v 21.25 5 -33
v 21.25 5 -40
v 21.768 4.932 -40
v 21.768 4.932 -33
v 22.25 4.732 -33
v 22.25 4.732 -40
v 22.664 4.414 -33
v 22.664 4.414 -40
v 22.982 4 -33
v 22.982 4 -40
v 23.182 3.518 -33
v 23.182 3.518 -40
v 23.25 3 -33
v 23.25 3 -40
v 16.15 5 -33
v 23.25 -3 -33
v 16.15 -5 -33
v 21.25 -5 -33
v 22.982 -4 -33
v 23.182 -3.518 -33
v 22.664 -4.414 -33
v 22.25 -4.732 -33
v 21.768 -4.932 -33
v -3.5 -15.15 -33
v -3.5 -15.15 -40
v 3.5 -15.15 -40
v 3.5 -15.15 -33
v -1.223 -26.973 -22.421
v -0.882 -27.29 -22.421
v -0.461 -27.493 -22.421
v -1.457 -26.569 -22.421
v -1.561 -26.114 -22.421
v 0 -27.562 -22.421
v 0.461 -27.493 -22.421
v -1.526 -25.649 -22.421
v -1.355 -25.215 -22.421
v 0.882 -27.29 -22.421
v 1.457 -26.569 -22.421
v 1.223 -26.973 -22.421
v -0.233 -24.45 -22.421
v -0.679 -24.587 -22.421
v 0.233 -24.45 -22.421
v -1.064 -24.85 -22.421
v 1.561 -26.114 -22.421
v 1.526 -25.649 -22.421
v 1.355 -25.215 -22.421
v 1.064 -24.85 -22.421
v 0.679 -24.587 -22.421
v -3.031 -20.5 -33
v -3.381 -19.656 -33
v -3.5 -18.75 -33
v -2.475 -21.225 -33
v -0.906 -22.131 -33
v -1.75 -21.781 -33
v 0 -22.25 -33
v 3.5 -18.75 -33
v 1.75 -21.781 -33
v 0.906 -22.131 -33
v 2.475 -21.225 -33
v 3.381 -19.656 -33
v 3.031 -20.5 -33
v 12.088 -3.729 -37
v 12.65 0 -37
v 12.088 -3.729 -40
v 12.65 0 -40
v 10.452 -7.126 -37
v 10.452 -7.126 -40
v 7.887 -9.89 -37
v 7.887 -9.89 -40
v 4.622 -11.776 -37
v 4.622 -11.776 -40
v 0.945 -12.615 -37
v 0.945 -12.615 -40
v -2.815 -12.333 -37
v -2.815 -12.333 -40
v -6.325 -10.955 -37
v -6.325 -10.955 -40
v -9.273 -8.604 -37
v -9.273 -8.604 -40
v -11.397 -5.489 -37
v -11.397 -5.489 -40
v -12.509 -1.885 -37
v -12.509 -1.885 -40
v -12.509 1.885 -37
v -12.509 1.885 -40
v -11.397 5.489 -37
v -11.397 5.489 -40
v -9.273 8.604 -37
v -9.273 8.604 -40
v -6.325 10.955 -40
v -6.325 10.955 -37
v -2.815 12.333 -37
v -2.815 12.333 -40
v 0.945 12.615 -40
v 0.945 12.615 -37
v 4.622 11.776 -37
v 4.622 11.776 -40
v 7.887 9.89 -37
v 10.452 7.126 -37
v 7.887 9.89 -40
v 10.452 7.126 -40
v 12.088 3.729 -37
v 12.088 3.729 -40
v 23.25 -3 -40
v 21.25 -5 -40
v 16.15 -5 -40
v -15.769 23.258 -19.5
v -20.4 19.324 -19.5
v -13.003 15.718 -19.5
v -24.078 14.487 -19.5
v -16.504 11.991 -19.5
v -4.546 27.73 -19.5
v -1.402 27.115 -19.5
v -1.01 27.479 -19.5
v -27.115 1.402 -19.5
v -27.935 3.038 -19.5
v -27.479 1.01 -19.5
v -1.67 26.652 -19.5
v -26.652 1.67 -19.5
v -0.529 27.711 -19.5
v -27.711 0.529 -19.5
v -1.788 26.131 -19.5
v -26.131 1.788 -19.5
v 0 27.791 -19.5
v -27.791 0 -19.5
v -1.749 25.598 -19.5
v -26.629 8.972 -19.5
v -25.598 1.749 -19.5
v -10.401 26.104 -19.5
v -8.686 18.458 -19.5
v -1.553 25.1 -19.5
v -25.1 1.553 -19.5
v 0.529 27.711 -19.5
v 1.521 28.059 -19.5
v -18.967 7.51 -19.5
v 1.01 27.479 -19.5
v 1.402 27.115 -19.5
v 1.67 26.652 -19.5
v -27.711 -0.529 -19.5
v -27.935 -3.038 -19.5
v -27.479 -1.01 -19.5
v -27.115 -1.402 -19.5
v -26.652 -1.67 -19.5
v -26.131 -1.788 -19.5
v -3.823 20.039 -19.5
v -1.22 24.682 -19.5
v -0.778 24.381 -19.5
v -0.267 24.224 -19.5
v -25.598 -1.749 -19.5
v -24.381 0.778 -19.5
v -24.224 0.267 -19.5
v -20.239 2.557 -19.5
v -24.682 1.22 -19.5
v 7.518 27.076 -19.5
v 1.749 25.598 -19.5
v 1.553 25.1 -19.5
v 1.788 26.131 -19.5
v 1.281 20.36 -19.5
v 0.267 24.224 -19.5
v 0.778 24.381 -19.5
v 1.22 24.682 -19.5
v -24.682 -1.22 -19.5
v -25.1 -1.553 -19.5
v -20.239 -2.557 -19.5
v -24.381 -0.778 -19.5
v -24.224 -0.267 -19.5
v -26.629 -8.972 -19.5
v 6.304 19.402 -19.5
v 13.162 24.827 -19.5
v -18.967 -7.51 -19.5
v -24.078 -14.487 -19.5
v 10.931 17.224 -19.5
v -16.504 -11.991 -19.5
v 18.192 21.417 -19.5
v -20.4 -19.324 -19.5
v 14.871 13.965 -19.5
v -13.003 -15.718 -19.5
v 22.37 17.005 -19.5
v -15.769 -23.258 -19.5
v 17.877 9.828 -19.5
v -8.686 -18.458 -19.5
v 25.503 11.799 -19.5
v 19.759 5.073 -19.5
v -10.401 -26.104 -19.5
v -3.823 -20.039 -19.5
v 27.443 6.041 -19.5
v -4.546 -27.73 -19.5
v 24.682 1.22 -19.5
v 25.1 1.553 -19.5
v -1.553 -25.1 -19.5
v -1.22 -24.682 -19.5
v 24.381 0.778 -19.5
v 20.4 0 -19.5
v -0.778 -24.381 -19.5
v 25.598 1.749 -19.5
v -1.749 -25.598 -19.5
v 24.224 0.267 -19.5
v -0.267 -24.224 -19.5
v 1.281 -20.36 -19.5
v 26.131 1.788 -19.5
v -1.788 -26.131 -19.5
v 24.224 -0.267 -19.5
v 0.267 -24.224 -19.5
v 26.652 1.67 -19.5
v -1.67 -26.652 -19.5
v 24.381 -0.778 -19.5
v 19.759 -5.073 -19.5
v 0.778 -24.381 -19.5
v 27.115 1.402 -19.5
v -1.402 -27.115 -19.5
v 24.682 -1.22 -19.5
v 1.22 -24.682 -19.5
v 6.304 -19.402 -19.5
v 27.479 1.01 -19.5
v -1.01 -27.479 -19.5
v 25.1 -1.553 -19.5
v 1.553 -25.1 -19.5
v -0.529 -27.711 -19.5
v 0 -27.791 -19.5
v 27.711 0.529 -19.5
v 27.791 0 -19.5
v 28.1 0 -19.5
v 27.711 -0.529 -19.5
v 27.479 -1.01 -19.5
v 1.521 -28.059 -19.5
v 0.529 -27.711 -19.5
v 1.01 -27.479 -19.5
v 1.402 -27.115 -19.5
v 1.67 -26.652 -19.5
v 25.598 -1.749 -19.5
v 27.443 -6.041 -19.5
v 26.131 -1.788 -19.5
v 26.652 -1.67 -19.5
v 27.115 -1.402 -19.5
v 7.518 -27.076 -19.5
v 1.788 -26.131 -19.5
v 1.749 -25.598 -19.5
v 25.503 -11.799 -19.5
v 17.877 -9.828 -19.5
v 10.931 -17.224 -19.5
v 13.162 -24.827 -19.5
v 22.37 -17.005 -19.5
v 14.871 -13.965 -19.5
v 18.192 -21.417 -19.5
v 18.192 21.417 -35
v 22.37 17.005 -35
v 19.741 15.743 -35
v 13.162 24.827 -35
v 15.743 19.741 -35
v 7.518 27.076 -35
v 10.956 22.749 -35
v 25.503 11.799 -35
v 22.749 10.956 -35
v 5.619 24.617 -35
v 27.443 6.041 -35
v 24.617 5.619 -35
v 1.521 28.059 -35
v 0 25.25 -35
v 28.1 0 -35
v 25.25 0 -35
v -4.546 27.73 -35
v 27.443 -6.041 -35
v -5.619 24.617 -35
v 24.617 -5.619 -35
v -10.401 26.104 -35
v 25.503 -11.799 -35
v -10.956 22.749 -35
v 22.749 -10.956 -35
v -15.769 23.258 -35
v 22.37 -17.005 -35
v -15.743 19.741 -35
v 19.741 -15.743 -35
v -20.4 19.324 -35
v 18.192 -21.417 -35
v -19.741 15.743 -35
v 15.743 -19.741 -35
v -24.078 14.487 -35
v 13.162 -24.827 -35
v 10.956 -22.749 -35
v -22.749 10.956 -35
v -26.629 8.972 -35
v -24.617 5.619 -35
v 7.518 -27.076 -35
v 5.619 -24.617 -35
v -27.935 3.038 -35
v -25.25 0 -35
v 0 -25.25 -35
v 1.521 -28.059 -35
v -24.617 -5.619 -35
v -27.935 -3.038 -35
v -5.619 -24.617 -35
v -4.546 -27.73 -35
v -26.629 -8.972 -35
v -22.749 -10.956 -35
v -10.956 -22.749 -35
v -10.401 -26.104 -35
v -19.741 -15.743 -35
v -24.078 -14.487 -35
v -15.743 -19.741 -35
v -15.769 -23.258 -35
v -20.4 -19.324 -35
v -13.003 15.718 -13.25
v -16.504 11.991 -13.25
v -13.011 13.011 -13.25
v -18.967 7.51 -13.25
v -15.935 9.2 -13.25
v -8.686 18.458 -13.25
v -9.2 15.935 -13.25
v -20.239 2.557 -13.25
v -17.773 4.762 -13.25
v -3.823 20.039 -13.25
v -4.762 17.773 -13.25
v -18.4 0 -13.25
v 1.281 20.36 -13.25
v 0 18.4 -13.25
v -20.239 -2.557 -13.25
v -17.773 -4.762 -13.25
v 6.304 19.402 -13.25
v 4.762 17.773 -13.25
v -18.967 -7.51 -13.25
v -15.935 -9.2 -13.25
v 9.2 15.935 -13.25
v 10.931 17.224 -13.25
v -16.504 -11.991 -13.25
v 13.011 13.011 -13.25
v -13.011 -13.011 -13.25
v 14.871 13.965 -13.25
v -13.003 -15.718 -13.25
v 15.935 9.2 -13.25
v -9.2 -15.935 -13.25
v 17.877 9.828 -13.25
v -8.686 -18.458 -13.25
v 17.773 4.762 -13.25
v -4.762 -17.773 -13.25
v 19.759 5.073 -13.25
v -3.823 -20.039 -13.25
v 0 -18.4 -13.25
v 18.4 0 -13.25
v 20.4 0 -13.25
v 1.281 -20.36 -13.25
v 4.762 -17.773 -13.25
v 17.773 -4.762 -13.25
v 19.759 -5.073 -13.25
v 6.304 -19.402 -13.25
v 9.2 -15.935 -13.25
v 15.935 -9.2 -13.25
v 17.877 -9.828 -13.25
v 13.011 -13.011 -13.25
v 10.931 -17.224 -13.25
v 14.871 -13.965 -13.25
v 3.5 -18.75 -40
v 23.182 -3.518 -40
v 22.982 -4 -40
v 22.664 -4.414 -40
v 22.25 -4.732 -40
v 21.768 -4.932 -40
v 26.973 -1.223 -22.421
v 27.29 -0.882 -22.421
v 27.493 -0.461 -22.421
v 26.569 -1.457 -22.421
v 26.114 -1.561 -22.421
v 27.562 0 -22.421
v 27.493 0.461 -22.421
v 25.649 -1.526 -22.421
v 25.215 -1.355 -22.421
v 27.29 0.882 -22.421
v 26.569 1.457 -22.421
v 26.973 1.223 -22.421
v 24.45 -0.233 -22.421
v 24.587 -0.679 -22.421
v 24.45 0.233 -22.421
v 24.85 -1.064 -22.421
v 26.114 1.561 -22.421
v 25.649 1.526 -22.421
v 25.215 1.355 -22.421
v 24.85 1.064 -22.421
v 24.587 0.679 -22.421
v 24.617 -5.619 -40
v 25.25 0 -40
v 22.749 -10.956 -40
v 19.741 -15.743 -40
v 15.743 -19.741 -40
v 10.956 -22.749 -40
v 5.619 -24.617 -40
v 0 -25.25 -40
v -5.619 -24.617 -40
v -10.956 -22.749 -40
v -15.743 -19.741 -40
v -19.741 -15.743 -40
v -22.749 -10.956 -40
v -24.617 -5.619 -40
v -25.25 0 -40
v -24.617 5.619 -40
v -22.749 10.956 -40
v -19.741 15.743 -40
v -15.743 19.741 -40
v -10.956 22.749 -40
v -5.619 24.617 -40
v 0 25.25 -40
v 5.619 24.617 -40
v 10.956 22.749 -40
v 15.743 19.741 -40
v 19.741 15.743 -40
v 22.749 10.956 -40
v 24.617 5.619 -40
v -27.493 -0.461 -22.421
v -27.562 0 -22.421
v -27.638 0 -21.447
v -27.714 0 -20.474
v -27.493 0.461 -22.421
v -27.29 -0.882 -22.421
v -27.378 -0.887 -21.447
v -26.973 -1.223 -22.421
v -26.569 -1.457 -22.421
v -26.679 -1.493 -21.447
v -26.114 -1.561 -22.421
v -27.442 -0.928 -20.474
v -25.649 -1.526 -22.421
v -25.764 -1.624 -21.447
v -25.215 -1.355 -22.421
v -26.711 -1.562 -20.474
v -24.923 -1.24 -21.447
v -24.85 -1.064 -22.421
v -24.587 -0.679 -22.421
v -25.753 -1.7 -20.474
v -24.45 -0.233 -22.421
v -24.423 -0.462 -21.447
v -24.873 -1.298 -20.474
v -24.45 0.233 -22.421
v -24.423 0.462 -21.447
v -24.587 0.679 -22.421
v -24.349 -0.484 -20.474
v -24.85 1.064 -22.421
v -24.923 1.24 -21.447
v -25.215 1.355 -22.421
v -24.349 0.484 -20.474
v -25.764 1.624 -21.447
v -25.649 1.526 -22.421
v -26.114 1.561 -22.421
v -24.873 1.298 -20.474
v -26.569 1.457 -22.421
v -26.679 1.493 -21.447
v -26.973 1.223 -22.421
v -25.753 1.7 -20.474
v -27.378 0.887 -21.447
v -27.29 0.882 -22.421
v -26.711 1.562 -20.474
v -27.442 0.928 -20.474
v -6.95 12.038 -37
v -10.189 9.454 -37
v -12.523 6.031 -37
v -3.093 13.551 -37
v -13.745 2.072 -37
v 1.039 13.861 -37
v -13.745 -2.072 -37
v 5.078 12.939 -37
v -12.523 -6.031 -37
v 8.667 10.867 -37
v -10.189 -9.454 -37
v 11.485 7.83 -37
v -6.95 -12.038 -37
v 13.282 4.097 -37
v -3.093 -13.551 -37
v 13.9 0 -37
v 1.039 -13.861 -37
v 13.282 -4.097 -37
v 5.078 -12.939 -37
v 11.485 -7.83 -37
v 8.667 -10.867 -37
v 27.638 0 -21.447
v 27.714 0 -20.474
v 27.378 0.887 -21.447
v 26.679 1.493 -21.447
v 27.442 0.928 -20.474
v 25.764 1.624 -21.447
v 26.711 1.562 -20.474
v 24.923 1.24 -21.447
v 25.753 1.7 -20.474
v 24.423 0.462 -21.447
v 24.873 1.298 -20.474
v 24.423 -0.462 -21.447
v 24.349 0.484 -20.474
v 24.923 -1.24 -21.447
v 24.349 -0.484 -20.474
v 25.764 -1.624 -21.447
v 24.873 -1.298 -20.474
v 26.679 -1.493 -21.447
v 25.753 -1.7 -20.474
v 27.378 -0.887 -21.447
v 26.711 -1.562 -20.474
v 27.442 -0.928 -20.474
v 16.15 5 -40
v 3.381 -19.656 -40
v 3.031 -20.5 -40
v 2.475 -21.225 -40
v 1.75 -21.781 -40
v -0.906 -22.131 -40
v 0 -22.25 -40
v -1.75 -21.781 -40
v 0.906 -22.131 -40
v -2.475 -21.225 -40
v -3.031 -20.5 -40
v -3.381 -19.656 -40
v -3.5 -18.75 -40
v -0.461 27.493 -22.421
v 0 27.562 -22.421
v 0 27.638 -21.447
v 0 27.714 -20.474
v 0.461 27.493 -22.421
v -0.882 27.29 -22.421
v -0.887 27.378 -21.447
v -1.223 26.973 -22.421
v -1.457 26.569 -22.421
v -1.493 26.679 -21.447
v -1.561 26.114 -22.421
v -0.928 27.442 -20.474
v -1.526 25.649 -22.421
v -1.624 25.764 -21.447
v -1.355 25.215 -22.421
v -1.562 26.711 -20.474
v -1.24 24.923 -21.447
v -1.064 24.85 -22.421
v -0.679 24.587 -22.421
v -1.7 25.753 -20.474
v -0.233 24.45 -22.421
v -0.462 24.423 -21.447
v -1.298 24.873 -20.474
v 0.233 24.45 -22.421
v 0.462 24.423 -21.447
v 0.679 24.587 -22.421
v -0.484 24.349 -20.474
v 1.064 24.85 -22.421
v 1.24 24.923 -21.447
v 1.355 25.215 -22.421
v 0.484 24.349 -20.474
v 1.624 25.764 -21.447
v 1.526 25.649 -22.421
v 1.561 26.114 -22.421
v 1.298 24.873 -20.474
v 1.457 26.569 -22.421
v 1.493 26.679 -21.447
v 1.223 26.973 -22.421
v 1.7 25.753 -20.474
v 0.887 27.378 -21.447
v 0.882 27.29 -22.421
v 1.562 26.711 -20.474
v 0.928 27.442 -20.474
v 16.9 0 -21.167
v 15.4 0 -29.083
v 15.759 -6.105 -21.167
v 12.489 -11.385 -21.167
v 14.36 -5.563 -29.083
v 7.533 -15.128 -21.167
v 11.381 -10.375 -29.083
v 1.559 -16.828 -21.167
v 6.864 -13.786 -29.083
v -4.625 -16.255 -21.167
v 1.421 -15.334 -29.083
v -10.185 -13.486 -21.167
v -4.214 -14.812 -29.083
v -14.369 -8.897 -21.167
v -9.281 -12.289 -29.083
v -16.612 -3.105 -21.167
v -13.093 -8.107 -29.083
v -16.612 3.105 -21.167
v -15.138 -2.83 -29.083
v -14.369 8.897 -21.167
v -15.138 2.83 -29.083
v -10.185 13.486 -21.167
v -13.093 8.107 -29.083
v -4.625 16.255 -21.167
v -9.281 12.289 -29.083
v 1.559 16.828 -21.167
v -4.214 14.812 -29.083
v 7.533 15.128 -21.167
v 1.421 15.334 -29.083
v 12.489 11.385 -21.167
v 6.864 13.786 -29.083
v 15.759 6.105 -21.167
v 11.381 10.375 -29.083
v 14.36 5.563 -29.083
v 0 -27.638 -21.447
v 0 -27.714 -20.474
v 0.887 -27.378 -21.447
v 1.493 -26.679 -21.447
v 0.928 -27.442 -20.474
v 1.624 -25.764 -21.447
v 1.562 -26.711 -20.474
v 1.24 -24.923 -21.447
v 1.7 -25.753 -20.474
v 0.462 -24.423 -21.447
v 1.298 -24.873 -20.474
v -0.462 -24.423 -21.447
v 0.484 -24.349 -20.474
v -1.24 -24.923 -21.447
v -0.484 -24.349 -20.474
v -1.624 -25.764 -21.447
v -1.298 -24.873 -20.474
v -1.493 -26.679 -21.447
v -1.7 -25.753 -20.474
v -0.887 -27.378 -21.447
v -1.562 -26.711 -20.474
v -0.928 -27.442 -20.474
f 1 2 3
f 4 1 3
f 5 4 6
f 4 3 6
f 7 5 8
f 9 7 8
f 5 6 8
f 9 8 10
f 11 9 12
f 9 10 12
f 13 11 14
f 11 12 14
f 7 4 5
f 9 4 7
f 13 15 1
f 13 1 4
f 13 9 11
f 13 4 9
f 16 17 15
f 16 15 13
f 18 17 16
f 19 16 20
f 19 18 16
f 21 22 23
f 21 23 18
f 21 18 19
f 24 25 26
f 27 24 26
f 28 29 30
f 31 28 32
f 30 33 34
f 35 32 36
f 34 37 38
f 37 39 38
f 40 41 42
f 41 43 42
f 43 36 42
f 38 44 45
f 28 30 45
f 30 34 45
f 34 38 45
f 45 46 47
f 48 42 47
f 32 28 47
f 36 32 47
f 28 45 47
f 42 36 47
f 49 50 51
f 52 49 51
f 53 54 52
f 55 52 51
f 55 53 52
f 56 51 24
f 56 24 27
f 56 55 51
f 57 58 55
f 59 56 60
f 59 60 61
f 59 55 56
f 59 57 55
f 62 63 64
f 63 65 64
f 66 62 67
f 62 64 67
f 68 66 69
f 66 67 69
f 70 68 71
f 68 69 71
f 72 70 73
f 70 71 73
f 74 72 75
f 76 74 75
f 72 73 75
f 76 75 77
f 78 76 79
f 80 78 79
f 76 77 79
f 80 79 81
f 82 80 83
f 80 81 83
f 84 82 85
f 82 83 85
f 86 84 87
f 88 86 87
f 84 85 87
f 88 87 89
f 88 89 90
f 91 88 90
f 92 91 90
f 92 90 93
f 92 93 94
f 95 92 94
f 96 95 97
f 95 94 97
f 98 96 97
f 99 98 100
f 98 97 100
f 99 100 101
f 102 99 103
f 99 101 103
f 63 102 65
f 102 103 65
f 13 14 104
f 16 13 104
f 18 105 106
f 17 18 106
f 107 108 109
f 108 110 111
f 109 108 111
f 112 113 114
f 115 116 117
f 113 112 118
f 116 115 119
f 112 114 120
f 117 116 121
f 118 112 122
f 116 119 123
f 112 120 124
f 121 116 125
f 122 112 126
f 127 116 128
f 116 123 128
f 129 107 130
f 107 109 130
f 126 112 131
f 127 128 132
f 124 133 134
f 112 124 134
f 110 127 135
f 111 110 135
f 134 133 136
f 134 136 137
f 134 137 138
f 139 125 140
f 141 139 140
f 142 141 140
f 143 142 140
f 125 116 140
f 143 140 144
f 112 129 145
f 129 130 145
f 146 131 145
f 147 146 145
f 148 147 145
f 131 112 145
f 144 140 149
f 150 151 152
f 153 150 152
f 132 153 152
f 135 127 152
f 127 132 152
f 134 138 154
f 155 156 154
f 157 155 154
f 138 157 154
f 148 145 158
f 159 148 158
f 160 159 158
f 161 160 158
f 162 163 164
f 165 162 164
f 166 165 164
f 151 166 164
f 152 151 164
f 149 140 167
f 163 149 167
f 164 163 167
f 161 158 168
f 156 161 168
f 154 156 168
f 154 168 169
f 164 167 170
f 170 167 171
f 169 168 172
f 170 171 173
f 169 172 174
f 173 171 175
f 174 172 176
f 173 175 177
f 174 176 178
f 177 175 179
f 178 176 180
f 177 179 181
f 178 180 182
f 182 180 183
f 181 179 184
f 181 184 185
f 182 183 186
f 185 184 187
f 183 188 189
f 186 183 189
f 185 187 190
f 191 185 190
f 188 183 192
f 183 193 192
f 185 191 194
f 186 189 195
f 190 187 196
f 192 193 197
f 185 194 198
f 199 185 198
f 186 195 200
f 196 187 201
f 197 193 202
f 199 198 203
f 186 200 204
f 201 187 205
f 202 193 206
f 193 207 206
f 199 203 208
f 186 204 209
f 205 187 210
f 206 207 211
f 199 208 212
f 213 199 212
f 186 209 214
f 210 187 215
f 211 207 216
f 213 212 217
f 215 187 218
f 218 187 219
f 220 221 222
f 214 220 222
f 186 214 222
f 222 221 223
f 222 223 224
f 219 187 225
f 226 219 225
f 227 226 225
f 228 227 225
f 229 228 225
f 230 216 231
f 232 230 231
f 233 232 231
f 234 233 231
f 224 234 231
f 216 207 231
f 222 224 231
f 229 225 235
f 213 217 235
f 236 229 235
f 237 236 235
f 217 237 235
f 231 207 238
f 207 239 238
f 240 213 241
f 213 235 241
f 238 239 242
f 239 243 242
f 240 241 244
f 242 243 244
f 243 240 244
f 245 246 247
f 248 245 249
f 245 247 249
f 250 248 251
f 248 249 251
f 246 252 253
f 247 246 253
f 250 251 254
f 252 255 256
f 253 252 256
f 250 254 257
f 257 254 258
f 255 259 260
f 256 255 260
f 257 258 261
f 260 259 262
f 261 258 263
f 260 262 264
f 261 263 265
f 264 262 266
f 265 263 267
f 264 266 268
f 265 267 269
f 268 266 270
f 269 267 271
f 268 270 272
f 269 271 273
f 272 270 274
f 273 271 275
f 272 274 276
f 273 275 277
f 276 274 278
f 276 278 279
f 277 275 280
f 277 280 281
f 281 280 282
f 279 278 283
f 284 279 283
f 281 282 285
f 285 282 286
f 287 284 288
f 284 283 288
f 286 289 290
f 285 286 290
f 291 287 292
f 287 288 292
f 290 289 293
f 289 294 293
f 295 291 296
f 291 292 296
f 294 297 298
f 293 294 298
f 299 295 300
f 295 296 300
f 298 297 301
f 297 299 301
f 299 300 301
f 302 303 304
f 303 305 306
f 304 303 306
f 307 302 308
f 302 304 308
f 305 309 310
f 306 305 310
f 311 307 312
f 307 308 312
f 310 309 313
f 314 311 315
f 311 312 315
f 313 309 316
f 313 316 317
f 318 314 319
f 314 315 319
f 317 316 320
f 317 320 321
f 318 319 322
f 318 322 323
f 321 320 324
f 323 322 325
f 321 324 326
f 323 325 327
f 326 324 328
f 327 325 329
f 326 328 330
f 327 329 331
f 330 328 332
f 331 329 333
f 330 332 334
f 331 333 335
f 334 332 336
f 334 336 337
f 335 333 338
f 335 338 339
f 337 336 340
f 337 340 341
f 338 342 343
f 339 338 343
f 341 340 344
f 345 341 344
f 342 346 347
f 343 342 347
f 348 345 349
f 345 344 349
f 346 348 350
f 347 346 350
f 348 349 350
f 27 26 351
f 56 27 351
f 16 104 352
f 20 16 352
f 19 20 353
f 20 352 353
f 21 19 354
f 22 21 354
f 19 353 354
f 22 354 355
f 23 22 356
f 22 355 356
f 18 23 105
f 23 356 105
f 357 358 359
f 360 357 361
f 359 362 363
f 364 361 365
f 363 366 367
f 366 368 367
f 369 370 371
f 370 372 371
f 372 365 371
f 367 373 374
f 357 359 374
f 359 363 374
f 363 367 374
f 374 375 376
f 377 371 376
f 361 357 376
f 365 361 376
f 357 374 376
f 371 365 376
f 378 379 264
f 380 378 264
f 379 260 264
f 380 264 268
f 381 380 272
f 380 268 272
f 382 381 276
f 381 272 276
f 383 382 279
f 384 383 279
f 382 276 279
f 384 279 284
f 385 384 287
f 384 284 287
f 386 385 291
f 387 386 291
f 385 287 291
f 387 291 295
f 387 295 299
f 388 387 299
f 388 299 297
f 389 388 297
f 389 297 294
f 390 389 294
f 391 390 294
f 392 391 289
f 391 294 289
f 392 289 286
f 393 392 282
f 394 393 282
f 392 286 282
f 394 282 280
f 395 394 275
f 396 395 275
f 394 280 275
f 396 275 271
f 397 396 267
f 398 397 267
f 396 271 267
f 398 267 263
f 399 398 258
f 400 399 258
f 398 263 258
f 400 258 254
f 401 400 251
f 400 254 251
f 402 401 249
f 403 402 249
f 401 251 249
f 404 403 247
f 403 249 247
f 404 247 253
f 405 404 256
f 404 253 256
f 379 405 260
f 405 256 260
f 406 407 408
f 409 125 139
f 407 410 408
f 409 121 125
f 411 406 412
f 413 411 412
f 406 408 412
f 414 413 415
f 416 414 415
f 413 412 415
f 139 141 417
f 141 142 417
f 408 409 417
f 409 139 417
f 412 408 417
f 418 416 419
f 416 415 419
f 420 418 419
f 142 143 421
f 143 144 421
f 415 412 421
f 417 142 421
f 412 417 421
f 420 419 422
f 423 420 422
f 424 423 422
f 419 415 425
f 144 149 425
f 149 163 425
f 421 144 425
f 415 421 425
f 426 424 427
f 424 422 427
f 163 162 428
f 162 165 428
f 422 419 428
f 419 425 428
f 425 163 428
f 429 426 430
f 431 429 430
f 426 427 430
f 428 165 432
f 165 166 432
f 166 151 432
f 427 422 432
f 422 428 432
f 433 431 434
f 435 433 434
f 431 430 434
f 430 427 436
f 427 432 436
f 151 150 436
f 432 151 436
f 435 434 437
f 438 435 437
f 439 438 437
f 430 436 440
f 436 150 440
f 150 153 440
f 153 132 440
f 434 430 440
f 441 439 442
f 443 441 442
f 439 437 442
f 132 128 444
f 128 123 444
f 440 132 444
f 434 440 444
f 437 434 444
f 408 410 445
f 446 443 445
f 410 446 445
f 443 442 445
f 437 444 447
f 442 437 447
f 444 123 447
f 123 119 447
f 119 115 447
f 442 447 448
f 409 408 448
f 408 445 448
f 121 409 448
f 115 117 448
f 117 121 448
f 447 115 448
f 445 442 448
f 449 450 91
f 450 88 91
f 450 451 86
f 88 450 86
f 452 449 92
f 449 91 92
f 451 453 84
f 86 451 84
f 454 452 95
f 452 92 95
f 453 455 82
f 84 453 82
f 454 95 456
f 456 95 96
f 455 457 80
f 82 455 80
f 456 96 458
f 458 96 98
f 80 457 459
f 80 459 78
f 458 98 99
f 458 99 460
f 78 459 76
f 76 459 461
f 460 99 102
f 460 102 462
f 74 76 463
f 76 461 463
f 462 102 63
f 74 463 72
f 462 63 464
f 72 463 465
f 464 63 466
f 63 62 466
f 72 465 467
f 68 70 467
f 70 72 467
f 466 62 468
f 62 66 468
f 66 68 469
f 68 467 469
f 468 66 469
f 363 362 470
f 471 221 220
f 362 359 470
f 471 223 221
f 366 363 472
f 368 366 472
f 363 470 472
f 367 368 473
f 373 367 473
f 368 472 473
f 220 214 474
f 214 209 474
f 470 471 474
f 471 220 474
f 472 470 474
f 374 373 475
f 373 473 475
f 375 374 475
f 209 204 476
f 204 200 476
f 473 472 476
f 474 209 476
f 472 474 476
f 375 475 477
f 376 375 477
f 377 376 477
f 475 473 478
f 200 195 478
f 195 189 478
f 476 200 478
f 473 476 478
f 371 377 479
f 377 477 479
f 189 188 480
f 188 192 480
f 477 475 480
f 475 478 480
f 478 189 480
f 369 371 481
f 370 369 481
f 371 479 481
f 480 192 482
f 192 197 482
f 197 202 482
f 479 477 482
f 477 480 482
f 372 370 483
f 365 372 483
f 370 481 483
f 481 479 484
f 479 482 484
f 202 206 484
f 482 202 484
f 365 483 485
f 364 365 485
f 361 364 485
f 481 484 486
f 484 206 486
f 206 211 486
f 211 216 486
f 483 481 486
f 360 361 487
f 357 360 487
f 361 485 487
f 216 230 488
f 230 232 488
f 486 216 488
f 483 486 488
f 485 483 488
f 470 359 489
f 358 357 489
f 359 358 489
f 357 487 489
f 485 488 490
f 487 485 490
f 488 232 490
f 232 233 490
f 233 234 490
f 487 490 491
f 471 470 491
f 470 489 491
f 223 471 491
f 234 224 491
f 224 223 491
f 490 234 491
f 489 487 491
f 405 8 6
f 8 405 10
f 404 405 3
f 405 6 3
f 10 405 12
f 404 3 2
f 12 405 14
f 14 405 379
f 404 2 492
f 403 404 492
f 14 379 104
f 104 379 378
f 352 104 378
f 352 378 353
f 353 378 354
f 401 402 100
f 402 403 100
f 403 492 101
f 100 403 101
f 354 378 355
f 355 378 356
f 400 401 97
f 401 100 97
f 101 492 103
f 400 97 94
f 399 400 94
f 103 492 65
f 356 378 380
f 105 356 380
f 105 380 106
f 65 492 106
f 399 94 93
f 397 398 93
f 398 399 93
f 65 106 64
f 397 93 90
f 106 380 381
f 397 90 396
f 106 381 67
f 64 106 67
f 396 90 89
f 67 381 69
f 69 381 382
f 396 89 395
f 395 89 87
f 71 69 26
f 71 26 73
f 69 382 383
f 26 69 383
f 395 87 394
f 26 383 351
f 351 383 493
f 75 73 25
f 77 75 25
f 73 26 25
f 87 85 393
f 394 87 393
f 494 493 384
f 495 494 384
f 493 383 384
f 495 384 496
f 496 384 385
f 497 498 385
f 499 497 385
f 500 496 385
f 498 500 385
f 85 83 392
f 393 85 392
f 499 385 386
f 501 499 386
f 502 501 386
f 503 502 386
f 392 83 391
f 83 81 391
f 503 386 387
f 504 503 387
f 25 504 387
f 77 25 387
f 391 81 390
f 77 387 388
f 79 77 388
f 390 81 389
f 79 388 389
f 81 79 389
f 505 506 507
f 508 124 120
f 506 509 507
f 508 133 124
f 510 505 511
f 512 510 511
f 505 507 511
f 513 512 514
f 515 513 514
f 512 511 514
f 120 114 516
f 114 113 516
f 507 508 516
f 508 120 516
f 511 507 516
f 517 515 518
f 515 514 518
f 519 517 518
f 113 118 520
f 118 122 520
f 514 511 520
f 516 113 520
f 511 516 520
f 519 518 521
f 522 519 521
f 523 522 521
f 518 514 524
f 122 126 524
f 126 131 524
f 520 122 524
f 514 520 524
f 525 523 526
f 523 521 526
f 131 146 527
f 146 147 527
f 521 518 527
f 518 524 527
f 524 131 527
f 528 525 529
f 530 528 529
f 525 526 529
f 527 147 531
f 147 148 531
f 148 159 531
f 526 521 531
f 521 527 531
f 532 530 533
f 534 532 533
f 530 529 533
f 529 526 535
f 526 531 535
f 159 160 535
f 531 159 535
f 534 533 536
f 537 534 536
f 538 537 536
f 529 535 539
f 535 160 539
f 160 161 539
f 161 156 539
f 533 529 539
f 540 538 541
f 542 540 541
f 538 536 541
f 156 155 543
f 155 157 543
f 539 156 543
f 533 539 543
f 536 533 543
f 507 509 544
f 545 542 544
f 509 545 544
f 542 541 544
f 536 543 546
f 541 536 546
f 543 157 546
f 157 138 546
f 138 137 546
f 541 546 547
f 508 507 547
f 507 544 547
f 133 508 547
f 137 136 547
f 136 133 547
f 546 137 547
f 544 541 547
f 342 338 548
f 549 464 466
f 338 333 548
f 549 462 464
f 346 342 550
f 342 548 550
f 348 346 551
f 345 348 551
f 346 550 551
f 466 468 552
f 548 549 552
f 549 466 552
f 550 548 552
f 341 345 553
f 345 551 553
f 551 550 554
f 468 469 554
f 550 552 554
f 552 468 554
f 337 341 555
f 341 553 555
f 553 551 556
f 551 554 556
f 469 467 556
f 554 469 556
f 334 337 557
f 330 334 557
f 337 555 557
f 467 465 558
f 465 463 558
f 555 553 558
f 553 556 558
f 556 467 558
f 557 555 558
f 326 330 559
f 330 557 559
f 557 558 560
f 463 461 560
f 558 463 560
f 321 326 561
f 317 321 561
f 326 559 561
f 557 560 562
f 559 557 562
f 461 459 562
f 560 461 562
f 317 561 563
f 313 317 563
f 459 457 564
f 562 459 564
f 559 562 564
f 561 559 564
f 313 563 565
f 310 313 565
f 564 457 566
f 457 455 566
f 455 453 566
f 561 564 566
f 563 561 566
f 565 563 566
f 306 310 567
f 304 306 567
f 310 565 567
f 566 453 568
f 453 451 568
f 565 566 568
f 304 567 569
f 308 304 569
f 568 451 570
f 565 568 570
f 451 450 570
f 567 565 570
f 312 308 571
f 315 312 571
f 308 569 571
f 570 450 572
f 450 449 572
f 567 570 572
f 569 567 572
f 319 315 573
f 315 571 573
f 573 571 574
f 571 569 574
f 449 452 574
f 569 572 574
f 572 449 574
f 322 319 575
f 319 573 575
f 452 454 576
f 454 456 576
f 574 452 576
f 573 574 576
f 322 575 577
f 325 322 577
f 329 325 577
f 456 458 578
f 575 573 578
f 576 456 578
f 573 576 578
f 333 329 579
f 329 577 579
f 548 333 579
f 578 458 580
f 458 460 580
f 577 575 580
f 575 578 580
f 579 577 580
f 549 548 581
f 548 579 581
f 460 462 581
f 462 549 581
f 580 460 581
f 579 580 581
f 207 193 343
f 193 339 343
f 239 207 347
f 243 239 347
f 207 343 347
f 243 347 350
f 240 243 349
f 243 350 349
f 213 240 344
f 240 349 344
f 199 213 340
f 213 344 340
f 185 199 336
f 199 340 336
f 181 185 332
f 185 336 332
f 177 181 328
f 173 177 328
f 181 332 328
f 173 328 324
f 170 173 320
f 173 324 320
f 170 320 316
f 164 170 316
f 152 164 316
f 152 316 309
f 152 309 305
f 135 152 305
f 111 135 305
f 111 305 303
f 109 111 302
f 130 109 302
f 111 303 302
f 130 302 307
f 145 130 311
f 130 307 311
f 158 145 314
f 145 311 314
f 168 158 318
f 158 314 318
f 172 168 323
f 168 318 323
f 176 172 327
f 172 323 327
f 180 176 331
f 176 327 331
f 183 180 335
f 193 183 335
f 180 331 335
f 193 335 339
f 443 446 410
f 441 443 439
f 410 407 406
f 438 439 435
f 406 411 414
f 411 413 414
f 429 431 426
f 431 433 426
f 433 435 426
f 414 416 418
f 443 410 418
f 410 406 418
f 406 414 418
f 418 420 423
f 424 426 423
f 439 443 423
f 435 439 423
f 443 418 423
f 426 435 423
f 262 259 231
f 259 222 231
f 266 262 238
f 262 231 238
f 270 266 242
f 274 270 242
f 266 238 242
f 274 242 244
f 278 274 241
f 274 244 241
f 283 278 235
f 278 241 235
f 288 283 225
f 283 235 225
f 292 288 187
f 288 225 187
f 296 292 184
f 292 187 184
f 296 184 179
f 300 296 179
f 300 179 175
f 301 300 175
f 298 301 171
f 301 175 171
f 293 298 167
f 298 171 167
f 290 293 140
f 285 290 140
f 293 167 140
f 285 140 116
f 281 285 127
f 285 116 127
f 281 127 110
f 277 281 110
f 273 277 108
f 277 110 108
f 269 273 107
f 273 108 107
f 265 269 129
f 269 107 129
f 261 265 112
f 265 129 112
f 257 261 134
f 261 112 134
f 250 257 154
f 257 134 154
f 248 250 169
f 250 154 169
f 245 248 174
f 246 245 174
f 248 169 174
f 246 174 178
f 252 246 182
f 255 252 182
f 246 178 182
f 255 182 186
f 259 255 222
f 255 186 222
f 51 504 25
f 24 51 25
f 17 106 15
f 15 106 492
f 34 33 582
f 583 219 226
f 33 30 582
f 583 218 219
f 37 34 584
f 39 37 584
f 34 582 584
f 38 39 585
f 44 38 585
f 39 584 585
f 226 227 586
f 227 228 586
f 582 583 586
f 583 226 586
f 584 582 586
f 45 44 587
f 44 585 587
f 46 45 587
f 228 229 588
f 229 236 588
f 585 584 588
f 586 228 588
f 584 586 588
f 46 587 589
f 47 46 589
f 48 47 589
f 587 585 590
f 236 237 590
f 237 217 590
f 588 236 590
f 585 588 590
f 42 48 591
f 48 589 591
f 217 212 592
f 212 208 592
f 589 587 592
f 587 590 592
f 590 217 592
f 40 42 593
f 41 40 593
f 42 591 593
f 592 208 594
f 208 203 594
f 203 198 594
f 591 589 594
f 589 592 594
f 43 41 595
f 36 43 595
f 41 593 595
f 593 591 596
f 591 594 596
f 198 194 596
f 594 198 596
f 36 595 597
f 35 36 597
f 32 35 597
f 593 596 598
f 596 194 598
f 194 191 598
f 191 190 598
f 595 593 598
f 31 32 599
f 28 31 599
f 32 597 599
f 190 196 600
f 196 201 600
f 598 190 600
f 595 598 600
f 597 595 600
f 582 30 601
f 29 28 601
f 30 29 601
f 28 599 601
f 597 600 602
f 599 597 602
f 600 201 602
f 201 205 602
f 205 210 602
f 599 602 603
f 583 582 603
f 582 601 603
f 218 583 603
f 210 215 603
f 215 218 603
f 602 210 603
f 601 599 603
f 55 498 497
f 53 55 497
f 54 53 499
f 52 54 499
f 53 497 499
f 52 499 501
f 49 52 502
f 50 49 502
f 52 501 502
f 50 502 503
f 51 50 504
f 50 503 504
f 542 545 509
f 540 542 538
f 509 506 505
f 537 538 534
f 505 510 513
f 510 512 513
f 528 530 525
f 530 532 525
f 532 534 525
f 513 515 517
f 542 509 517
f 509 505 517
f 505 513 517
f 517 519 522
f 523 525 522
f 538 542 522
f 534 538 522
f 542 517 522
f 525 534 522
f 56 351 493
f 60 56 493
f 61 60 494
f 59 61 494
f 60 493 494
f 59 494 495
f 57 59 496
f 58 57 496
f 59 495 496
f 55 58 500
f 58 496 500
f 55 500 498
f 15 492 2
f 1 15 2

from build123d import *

# Parameters (mm, degrees)
F4_COPIES_COUNT = 4
F6_DEPTH        = 7


# Not quite as in the source:
# - a pattern or mirror of a feature is missing from the dataset's text; its kind, count and spacing are read off the source's solid


with BuildPart() as f1:
    # F0 (on Front) → F1 (revolve)
    with BuildSketch(Plane.XZ):
        Polygon((12.65, -40), (25.25, -40), (25.25, -35), (28.1, -35), (28.1, -19.5), (20.4, -19.5), (20.4, -13.25), (18.4, -13.25), (13.9, -37), (12.65, -37), align=None)
    revolve(axis=Axis((0, 0, -3.8875962891), (0, 0, -1)))

    # F3 (on Front) → F4 (revolve, cut)
    with BuildSketch(Plane.XZ):
        Polygon((27.7907, -19.5), (25.9972140193, -19.5), (25.9972140193, -22.421), (27.5621, -22.421), align=None)
    f4 = revolve(axis=Axis((25.9972140193, 0, -20.9605), (0, 0, 1)), mode=Mode.SUBTRACT)

    # F4_copies: F4 ×4 about axis
    f4_copies_axis = Axis((0, 0, 0), (0, 0, 1))
    for i in range(1, F4_COPIES_COUNT):
        add(f4.rotate(f4_copies_axis, i * 360 / F4_COPIES_COUNT), mode=Mode.SUBTRACT)

    # F5 (on face) → F6 (cut)
    with BuildSketch(Plane(origin=(0, 0, -40), x_dir=(1, 0, 0), z_dir=(0, 0, -1))):
        with BuildLine():
            Line((-3.5, 18.75), (-3.5, 15.15))
            Line((-3.5, 15.15), (3.5, 15.15))
            Line((3.5, 15.15), (3.5, 18.75))
            ThreePointArc((3.5, 18.75), (2.4748737342, 21.2248737342), (0, 22.25))
            ThreePointArc((0, 22.25), (-2.4748737342, 21.2248737342), (-3.5, 18.75))
        make_face()
        with BuildLine():
            ThreePointArc((23.25, 3), (22.6642135624, 4.4142135624), (21.25, 5))
            Line((21.25, 5), (16.15, 5))
            Line((16.15, 5), (16.15, -5))
            Line((16.15, -5), (21.25, -5))
            ThreePointArc((21.25, -5), (22.6642135624, -4.4142135624), (23.25, -3))
            Line((23.25, -3), (23.25, 3))
        make_face()
    extrude(amount=-F6_DEPTH, mode=Mode.SUBTRACT)


solid = f1.part
